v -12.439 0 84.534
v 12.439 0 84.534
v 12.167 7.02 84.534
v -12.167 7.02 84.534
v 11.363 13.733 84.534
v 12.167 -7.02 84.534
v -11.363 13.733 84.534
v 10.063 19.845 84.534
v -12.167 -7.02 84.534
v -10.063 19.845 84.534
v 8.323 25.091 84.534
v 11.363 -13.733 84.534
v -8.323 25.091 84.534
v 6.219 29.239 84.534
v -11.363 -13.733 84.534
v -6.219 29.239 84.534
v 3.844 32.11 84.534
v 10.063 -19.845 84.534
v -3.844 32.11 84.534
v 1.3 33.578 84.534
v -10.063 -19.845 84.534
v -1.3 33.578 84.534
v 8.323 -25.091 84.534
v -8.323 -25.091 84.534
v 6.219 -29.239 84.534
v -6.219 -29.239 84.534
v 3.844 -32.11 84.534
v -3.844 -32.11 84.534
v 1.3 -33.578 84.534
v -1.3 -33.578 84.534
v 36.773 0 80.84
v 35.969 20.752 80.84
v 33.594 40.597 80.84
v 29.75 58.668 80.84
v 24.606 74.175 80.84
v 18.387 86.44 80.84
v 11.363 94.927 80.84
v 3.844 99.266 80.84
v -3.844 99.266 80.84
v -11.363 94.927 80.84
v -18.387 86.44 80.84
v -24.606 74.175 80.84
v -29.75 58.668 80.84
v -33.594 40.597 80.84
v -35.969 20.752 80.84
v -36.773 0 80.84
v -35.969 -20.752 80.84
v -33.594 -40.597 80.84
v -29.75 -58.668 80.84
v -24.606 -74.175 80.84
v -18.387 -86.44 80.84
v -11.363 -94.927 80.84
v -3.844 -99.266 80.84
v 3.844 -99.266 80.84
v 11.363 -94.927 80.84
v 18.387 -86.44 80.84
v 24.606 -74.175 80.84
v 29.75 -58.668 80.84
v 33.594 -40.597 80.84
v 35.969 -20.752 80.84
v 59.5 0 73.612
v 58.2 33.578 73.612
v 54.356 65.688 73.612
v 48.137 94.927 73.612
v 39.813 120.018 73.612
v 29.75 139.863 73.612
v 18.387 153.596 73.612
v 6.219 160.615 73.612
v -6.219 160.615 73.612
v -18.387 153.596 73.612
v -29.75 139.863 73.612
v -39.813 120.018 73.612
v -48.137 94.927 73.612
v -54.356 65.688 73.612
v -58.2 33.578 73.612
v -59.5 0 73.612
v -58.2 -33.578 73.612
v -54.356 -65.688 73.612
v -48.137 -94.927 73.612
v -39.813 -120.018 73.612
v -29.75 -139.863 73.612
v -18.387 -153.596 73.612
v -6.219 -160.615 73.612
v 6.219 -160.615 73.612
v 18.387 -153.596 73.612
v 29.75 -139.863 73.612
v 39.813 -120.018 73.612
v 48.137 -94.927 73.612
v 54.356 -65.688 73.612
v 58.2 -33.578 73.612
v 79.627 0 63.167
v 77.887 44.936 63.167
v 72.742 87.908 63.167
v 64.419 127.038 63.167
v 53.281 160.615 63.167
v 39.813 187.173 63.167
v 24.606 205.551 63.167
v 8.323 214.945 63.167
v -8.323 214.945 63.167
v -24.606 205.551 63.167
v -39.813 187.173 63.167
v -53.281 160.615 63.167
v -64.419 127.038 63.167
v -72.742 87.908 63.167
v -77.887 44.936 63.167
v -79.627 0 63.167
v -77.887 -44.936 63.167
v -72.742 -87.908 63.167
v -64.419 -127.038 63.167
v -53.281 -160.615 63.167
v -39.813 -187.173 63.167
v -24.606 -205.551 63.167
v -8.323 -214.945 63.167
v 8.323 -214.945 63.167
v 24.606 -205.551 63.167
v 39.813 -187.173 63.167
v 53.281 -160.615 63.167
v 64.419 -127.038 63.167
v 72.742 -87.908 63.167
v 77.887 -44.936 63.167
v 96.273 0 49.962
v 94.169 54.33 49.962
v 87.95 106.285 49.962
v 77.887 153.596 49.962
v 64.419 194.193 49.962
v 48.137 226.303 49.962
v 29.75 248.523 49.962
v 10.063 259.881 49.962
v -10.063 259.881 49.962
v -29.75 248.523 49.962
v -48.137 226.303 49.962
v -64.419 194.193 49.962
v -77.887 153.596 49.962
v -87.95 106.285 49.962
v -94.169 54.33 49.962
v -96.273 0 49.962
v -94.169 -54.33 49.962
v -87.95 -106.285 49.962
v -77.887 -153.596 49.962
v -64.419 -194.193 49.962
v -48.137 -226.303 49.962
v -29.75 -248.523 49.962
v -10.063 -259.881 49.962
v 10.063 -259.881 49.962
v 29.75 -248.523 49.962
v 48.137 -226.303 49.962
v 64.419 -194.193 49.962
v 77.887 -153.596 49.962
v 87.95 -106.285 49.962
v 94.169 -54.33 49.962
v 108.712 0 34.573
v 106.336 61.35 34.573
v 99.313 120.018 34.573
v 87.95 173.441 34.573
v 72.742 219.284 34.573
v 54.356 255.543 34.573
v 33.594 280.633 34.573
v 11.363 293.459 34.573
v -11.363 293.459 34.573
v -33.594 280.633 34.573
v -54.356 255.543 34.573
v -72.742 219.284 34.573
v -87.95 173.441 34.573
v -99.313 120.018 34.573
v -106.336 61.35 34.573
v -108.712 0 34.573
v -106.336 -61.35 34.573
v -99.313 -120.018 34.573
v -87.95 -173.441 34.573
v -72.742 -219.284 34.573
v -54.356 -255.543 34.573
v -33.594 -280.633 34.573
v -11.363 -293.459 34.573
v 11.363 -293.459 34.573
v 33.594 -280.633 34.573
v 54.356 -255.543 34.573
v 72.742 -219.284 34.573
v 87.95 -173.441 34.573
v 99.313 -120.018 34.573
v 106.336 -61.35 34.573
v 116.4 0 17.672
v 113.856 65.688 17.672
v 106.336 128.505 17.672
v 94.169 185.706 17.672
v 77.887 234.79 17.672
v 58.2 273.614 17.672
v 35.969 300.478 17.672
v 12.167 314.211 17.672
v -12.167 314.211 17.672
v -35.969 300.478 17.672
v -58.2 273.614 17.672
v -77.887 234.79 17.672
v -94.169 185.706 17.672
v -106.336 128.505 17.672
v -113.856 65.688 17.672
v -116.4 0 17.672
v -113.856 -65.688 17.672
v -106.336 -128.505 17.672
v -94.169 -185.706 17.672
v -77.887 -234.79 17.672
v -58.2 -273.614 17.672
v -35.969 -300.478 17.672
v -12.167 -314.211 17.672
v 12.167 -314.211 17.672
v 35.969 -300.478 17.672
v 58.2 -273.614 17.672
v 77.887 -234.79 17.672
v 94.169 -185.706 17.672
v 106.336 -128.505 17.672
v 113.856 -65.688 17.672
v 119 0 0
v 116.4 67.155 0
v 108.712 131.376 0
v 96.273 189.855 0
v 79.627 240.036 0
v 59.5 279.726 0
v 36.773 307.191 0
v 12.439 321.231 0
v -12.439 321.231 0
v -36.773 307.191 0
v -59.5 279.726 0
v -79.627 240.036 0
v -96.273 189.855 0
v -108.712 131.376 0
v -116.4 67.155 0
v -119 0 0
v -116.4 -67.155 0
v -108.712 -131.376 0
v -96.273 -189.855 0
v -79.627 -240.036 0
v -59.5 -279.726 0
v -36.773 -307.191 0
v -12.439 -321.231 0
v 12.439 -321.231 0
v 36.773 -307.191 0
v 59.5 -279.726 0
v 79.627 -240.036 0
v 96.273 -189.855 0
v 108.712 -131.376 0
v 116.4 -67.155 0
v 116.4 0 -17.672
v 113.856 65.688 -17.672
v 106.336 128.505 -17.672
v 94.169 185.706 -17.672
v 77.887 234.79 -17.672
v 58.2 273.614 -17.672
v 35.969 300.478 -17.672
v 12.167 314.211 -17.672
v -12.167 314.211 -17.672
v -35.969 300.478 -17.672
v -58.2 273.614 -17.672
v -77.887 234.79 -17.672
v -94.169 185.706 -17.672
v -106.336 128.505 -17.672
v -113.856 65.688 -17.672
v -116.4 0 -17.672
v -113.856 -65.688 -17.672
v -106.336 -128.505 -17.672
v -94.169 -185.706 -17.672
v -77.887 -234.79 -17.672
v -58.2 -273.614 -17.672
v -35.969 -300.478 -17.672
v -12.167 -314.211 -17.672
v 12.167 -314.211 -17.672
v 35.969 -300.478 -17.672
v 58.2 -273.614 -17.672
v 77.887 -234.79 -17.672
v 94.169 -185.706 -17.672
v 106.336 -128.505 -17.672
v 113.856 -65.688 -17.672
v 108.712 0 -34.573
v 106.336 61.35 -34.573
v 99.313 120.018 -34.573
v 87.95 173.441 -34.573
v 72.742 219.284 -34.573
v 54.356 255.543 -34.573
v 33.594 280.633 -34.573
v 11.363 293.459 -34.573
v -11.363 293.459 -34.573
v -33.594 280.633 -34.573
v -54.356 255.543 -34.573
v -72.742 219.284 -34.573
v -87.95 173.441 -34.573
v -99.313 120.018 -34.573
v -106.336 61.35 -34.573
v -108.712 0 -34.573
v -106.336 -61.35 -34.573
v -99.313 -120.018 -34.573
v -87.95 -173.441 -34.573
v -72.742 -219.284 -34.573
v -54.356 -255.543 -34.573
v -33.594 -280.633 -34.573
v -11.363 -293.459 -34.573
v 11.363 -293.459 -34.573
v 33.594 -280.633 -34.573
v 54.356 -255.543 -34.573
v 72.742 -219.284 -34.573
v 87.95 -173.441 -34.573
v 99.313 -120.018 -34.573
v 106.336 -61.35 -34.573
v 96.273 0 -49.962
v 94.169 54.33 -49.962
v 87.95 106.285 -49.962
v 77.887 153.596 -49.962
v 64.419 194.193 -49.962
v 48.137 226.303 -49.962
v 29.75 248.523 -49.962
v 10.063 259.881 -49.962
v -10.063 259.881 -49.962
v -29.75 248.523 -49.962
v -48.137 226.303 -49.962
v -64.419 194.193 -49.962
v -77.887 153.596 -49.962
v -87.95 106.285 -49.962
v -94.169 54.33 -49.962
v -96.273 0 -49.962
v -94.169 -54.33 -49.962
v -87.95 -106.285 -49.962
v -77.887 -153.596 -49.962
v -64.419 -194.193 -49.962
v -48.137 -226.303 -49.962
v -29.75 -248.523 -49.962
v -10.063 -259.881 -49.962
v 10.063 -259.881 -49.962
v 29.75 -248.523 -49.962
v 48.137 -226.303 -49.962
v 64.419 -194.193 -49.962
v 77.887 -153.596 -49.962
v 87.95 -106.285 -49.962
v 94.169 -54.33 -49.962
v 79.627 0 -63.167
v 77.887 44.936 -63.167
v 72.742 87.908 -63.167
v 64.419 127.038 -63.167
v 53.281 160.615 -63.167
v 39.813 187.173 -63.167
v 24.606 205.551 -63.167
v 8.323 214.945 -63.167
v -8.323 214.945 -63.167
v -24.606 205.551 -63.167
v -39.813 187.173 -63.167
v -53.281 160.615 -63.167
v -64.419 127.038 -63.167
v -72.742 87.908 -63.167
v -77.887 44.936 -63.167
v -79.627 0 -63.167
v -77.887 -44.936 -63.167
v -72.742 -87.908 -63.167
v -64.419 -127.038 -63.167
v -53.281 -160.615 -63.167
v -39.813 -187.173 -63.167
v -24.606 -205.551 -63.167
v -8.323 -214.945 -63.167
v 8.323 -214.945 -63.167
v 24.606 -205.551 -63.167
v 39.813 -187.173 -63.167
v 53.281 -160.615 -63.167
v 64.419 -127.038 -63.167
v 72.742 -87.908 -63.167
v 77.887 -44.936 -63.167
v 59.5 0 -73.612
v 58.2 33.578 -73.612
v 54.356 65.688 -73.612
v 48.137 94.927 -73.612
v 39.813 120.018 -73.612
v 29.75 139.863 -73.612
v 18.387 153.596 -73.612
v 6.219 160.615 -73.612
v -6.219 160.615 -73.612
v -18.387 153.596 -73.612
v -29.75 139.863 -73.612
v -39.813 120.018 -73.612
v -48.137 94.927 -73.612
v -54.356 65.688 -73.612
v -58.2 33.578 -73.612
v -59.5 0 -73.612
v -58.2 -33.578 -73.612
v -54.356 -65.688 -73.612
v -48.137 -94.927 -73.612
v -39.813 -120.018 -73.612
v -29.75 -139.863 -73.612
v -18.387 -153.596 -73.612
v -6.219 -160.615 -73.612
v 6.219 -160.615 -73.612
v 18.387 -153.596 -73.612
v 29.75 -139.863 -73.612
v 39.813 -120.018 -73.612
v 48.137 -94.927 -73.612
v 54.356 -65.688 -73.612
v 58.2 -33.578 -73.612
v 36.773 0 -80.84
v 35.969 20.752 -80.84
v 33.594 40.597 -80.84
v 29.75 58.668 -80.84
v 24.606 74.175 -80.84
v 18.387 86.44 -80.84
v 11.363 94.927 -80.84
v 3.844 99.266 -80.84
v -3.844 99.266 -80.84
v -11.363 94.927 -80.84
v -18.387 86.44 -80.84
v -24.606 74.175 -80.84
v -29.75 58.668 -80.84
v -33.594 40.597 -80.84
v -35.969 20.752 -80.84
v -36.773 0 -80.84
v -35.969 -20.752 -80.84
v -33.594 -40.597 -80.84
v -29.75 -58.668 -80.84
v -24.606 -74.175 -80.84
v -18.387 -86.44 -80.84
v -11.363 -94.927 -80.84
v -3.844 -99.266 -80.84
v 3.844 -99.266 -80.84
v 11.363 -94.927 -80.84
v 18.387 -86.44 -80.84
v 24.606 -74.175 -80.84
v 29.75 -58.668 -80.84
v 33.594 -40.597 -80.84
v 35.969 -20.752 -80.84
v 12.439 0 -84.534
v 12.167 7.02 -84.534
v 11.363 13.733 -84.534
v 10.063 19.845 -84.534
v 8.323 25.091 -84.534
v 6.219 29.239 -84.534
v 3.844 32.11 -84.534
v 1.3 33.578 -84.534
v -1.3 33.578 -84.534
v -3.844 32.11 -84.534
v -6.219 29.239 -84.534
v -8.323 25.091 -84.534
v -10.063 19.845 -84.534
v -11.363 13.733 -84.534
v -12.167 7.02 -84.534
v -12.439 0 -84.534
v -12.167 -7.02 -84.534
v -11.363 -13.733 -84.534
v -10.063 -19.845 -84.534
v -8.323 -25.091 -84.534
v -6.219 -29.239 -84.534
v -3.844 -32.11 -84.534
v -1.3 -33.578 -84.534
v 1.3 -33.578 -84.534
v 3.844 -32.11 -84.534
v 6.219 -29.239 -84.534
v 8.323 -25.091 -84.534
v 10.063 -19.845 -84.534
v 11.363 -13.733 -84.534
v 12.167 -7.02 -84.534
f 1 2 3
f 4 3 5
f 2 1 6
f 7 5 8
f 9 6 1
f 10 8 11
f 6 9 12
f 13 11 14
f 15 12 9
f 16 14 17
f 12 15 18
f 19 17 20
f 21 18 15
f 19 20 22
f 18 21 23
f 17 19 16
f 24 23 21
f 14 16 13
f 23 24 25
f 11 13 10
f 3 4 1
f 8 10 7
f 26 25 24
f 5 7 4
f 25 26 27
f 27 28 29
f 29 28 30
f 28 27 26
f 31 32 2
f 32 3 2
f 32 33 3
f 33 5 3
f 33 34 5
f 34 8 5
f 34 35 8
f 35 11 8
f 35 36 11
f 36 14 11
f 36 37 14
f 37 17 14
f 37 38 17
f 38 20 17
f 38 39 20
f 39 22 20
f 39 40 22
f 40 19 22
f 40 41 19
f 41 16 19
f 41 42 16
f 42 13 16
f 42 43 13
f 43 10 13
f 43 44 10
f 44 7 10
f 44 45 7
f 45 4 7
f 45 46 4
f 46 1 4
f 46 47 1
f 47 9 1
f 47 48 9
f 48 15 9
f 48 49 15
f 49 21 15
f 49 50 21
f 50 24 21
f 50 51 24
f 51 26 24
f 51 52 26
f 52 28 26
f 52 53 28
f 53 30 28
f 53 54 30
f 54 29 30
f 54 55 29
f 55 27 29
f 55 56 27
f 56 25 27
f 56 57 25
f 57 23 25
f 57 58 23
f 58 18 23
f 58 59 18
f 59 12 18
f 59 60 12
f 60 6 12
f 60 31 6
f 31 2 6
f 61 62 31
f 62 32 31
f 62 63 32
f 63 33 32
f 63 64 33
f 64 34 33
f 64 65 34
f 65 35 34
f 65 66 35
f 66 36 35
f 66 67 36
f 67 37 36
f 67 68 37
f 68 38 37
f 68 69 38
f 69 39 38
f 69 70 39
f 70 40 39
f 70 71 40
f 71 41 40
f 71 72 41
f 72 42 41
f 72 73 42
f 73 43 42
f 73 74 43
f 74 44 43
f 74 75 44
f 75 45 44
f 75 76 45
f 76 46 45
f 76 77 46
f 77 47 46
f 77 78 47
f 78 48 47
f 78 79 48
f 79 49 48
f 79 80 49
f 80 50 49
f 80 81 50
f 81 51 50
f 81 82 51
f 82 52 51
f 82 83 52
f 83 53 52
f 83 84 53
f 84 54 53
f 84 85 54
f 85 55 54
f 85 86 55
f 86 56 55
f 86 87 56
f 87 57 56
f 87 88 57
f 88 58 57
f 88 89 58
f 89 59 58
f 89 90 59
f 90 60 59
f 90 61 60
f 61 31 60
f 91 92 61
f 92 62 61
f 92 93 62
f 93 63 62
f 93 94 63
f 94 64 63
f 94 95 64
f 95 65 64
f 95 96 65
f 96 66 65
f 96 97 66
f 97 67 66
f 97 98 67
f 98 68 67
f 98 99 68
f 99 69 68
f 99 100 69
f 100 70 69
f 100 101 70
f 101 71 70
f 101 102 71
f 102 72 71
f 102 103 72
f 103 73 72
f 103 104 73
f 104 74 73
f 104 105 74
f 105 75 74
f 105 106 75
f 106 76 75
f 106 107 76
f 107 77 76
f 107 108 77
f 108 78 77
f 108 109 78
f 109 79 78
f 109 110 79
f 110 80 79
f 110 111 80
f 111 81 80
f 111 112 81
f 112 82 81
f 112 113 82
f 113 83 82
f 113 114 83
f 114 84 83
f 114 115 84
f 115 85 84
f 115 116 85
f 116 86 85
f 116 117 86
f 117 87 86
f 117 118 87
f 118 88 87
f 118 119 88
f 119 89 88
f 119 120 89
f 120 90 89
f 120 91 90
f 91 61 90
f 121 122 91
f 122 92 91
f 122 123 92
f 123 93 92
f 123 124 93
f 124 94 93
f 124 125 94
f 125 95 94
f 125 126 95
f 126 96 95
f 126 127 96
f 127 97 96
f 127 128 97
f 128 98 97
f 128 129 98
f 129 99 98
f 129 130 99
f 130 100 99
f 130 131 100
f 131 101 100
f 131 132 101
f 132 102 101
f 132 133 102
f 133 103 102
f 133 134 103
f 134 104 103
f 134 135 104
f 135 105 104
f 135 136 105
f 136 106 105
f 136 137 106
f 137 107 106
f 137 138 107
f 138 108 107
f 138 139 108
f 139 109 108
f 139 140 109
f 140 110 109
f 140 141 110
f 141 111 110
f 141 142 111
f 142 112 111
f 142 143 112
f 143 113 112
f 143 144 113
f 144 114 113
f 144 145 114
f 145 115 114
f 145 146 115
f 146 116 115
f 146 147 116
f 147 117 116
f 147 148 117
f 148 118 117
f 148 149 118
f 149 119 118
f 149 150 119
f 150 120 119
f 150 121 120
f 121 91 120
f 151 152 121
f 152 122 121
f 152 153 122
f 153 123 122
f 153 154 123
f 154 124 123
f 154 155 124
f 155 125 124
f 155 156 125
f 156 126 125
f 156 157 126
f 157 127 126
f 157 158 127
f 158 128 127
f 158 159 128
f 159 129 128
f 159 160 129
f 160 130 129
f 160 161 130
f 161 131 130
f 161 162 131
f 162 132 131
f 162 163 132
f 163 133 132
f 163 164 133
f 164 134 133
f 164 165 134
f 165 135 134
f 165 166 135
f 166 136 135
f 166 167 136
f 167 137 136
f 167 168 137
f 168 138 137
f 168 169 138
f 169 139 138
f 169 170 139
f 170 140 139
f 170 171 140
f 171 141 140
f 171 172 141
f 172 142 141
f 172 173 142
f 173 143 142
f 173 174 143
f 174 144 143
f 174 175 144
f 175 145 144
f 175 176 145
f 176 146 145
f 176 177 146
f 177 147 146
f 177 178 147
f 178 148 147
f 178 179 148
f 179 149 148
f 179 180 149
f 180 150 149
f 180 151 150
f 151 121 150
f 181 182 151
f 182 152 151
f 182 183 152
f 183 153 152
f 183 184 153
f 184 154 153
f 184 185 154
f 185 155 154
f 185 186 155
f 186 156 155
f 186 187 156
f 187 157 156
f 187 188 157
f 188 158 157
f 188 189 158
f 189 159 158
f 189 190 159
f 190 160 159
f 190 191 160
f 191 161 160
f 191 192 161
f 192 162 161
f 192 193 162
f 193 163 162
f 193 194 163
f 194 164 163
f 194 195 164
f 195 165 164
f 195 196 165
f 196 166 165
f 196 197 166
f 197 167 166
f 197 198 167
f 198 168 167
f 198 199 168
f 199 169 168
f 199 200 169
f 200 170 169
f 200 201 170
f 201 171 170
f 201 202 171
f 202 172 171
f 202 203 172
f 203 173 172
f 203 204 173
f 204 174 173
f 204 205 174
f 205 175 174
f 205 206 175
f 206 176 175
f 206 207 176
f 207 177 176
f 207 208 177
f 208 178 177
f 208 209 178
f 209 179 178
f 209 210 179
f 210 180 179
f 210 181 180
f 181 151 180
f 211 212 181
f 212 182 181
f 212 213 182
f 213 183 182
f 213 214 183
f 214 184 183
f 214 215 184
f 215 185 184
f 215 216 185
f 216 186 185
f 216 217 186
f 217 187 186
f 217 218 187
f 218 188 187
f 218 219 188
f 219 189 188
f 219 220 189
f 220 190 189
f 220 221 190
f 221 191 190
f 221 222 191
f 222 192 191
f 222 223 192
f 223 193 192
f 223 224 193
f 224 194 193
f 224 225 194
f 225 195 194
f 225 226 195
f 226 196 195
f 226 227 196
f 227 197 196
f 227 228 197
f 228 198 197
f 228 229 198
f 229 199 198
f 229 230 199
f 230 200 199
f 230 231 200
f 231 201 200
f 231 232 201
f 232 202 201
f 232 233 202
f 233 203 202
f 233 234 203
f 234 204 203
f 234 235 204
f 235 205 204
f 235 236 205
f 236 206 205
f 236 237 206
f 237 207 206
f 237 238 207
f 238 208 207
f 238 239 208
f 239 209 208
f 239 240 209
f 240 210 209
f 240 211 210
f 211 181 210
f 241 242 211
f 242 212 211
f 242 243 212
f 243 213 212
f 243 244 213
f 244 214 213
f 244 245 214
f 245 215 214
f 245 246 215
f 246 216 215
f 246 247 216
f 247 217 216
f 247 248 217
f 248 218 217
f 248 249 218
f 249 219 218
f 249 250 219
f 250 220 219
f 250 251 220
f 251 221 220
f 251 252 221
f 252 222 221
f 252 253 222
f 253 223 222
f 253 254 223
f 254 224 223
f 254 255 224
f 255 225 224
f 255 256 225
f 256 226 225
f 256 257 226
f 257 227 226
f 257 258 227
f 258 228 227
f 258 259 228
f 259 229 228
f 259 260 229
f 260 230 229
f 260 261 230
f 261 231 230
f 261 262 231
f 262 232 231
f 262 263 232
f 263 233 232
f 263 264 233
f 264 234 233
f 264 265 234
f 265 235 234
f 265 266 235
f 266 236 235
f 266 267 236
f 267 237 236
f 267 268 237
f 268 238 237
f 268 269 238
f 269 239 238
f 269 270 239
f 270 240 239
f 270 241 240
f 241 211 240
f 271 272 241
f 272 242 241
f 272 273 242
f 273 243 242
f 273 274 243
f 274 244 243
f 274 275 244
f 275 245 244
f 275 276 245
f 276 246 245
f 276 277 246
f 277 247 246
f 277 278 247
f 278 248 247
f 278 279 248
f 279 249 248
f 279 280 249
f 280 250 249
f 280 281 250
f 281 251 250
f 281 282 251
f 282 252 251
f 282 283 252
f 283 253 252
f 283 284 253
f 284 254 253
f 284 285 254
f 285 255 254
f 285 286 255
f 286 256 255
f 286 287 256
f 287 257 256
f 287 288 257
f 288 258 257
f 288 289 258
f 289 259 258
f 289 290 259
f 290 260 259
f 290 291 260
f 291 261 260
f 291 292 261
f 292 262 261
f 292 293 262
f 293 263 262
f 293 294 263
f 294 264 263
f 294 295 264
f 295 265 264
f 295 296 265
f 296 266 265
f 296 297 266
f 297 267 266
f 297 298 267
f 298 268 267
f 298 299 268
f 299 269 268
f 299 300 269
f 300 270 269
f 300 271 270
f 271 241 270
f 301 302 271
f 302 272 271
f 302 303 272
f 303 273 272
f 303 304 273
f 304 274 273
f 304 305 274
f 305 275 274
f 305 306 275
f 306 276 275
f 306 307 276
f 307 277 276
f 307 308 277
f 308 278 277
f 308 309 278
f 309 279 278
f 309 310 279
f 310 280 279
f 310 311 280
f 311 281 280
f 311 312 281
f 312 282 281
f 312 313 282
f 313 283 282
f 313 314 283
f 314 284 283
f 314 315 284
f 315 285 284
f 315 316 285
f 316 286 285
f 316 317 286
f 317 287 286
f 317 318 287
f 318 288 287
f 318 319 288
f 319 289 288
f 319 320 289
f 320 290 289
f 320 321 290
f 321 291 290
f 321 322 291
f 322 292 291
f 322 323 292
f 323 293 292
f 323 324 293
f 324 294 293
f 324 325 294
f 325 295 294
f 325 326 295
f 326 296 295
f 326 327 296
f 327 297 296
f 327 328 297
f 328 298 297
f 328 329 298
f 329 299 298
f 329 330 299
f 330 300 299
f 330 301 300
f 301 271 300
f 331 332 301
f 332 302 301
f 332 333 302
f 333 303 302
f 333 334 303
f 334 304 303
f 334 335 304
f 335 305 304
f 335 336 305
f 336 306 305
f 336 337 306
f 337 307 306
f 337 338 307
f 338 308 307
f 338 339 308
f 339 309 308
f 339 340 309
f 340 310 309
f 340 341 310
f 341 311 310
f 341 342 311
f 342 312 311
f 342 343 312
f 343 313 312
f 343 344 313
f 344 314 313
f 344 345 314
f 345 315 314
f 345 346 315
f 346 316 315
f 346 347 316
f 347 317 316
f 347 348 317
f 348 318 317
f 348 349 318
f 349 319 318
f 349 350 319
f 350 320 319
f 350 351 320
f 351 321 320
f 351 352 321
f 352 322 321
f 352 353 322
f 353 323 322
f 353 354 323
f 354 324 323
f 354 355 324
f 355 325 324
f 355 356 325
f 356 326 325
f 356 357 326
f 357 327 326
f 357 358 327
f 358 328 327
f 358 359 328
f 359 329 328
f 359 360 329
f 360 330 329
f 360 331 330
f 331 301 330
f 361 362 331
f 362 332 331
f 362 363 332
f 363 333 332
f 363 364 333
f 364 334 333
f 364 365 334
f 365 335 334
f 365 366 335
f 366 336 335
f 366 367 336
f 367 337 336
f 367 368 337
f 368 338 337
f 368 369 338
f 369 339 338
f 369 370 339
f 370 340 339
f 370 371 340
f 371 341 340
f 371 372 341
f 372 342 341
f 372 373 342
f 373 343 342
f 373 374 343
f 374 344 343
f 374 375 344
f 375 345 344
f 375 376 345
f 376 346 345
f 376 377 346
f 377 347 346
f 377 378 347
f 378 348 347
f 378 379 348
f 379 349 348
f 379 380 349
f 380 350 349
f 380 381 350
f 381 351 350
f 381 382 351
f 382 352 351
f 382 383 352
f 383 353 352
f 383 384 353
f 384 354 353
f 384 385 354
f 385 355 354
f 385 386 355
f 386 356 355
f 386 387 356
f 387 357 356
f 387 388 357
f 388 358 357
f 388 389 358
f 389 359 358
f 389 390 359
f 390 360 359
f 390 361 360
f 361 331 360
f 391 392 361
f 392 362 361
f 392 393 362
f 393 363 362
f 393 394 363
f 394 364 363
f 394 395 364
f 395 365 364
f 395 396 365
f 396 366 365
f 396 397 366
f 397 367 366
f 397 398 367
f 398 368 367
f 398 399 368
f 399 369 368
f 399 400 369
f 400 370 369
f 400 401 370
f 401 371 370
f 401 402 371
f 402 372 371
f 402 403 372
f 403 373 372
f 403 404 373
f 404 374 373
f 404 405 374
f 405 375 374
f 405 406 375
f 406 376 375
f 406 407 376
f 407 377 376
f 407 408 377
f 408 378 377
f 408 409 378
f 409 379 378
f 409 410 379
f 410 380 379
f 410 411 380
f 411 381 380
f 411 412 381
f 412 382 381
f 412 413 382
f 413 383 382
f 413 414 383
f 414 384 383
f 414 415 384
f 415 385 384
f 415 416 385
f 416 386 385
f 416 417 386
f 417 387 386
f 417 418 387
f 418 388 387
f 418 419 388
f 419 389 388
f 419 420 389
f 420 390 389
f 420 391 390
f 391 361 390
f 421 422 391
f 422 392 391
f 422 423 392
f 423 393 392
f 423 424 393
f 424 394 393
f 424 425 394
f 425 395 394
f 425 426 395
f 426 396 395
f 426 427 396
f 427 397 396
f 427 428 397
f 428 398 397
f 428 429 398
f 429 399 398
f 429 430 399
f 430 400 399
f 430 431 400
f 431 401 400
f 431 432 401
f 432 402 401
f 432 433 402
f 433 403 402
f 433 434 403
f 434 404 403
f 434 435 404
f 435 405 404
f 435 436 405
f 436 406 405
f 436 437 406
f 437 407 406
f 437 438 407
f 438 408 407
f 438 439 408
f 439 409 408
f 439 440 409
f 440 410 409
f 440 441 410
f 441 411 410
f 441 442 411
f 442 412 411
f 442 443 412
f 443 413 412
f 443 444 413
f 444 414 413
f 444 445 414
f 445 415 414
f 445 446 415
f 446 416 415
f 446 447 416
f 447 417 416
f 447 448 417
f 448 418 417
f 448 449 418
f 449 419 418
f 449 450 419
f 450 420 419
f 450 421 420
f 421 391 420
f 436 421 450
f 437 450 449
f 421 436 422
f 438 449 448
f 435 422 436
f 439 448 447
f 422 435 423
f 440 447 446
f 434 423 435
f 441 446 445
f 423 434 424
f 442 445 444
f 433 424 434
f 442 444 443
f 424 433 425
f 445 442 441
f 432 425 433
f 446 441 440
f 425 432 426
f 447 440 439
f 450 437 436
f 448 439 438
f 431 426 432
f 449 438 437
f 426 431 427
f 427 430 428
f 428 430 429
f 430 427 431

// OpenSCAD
// Generated by SolidPython 1.0.1 on 2020-07-29 00:46:48


scale(v = [7, 19, 5]) {
	sphere(r = 17);
}
/***********************************************
*********      SolidPython code:      **********
************************************************
 
# import packages: SolidPython
from solid import *
from solid.utils import *
from itertools import chain, combinations, permutations


class Resize:

    def __init__(self, scad_file):
        self.scad_file = scad_file
        #self.scad_file = import_scad(scad_file)
        # cone/cylinder param:
        self.r1 = 0
        self.r2 = 0
        self.h = 0
        # rectangular prism param:
        self.w = 0
        self.l = 0
        # ellipse param:
        self.r = 0

    # import OpenScad code (file name corresponds to shape)


    # classify shape + parameters
    def assign(self, param1, param2, param3):
        if self.scad_file == 'cone.scad':
            self.r1 = param1
            self.r2 = param2
            self.h = param3
        elif self.scad_file == 'cylinder.scad':
            self.r1 = param1
            self.r2 = param2
            self.h = param3
        elif self.scad_file == 'rectangularPrism.scad':
            self.h = param1
            self.l = param2
            self.w = param3
        else:
            self.r = param1
            self.h = param2

    # resize parameters
    def iterate(self):
        x = range(3, 20, 2)
        i = 1
        if self.scad_file == 'cone.scad':
            tempList = list(permutations(x, 2))
            for temp in tempList:
                param1 = temp[0]
                param2 = temp[1]
                filepath = 'produced_scad_files/' + 'cone' + str(param1) + '_' + str(param2) + '_' + '.scad'
                scad_render_to_file(cylinder(h=param1, r1=param2, r2=0), filepath)

        elif self.scad_file == 'cylinder.scad':
            tempList = list(permutations(x, 3))
            for temp in tempList:
                param1 = temp[0]
                param2 = temp[1]
                filepath = 'produced_scad_files/' + 'cylinder' + str(param1) + '_' + str(param2) + '_' + '.scad'
                scad_render_to_file(cylinder(h=param1, r1=param2, r2=param2), filepath)

        elif self.scad_file == 'rectangularPrism.scad':
            tempList = list(permutations(x, 3))
            for temp in tempList:
                param1 = temp[0]
                param2 = temp[1]
                param3 = temp[2]
                filepath = 'produced_scad_files/' + 'rectangularPrism' + str(param1) + '_' + str(param2) + '_' + str(
                    param3) + '.scad'
                scad_render_to_file(cube(size=(param1, param2, param3)), filepath)

        elif self.scad_file == 'ellipse.scad':
            tempList = list(permutations(x, 4))
            for temp in tempList:
                param1 = temp[0]
                param2 = temp[1]
                param3 = temp[2]
                param4 = temp[3]
                filepath = 'produced_scad_files/' + 'ellipse' + str(param1) + '_' + str(param2) + '_' + str(param3) + '_' + str(param4) + '.scad'
                scad_render_to_file(scale([param1, param2, param3])(sphere(r=param4)), filepath)

    def render_to_scadfile(self):
        scad_render_to_file(scad, 'example.scad') 
 
************************************************/
